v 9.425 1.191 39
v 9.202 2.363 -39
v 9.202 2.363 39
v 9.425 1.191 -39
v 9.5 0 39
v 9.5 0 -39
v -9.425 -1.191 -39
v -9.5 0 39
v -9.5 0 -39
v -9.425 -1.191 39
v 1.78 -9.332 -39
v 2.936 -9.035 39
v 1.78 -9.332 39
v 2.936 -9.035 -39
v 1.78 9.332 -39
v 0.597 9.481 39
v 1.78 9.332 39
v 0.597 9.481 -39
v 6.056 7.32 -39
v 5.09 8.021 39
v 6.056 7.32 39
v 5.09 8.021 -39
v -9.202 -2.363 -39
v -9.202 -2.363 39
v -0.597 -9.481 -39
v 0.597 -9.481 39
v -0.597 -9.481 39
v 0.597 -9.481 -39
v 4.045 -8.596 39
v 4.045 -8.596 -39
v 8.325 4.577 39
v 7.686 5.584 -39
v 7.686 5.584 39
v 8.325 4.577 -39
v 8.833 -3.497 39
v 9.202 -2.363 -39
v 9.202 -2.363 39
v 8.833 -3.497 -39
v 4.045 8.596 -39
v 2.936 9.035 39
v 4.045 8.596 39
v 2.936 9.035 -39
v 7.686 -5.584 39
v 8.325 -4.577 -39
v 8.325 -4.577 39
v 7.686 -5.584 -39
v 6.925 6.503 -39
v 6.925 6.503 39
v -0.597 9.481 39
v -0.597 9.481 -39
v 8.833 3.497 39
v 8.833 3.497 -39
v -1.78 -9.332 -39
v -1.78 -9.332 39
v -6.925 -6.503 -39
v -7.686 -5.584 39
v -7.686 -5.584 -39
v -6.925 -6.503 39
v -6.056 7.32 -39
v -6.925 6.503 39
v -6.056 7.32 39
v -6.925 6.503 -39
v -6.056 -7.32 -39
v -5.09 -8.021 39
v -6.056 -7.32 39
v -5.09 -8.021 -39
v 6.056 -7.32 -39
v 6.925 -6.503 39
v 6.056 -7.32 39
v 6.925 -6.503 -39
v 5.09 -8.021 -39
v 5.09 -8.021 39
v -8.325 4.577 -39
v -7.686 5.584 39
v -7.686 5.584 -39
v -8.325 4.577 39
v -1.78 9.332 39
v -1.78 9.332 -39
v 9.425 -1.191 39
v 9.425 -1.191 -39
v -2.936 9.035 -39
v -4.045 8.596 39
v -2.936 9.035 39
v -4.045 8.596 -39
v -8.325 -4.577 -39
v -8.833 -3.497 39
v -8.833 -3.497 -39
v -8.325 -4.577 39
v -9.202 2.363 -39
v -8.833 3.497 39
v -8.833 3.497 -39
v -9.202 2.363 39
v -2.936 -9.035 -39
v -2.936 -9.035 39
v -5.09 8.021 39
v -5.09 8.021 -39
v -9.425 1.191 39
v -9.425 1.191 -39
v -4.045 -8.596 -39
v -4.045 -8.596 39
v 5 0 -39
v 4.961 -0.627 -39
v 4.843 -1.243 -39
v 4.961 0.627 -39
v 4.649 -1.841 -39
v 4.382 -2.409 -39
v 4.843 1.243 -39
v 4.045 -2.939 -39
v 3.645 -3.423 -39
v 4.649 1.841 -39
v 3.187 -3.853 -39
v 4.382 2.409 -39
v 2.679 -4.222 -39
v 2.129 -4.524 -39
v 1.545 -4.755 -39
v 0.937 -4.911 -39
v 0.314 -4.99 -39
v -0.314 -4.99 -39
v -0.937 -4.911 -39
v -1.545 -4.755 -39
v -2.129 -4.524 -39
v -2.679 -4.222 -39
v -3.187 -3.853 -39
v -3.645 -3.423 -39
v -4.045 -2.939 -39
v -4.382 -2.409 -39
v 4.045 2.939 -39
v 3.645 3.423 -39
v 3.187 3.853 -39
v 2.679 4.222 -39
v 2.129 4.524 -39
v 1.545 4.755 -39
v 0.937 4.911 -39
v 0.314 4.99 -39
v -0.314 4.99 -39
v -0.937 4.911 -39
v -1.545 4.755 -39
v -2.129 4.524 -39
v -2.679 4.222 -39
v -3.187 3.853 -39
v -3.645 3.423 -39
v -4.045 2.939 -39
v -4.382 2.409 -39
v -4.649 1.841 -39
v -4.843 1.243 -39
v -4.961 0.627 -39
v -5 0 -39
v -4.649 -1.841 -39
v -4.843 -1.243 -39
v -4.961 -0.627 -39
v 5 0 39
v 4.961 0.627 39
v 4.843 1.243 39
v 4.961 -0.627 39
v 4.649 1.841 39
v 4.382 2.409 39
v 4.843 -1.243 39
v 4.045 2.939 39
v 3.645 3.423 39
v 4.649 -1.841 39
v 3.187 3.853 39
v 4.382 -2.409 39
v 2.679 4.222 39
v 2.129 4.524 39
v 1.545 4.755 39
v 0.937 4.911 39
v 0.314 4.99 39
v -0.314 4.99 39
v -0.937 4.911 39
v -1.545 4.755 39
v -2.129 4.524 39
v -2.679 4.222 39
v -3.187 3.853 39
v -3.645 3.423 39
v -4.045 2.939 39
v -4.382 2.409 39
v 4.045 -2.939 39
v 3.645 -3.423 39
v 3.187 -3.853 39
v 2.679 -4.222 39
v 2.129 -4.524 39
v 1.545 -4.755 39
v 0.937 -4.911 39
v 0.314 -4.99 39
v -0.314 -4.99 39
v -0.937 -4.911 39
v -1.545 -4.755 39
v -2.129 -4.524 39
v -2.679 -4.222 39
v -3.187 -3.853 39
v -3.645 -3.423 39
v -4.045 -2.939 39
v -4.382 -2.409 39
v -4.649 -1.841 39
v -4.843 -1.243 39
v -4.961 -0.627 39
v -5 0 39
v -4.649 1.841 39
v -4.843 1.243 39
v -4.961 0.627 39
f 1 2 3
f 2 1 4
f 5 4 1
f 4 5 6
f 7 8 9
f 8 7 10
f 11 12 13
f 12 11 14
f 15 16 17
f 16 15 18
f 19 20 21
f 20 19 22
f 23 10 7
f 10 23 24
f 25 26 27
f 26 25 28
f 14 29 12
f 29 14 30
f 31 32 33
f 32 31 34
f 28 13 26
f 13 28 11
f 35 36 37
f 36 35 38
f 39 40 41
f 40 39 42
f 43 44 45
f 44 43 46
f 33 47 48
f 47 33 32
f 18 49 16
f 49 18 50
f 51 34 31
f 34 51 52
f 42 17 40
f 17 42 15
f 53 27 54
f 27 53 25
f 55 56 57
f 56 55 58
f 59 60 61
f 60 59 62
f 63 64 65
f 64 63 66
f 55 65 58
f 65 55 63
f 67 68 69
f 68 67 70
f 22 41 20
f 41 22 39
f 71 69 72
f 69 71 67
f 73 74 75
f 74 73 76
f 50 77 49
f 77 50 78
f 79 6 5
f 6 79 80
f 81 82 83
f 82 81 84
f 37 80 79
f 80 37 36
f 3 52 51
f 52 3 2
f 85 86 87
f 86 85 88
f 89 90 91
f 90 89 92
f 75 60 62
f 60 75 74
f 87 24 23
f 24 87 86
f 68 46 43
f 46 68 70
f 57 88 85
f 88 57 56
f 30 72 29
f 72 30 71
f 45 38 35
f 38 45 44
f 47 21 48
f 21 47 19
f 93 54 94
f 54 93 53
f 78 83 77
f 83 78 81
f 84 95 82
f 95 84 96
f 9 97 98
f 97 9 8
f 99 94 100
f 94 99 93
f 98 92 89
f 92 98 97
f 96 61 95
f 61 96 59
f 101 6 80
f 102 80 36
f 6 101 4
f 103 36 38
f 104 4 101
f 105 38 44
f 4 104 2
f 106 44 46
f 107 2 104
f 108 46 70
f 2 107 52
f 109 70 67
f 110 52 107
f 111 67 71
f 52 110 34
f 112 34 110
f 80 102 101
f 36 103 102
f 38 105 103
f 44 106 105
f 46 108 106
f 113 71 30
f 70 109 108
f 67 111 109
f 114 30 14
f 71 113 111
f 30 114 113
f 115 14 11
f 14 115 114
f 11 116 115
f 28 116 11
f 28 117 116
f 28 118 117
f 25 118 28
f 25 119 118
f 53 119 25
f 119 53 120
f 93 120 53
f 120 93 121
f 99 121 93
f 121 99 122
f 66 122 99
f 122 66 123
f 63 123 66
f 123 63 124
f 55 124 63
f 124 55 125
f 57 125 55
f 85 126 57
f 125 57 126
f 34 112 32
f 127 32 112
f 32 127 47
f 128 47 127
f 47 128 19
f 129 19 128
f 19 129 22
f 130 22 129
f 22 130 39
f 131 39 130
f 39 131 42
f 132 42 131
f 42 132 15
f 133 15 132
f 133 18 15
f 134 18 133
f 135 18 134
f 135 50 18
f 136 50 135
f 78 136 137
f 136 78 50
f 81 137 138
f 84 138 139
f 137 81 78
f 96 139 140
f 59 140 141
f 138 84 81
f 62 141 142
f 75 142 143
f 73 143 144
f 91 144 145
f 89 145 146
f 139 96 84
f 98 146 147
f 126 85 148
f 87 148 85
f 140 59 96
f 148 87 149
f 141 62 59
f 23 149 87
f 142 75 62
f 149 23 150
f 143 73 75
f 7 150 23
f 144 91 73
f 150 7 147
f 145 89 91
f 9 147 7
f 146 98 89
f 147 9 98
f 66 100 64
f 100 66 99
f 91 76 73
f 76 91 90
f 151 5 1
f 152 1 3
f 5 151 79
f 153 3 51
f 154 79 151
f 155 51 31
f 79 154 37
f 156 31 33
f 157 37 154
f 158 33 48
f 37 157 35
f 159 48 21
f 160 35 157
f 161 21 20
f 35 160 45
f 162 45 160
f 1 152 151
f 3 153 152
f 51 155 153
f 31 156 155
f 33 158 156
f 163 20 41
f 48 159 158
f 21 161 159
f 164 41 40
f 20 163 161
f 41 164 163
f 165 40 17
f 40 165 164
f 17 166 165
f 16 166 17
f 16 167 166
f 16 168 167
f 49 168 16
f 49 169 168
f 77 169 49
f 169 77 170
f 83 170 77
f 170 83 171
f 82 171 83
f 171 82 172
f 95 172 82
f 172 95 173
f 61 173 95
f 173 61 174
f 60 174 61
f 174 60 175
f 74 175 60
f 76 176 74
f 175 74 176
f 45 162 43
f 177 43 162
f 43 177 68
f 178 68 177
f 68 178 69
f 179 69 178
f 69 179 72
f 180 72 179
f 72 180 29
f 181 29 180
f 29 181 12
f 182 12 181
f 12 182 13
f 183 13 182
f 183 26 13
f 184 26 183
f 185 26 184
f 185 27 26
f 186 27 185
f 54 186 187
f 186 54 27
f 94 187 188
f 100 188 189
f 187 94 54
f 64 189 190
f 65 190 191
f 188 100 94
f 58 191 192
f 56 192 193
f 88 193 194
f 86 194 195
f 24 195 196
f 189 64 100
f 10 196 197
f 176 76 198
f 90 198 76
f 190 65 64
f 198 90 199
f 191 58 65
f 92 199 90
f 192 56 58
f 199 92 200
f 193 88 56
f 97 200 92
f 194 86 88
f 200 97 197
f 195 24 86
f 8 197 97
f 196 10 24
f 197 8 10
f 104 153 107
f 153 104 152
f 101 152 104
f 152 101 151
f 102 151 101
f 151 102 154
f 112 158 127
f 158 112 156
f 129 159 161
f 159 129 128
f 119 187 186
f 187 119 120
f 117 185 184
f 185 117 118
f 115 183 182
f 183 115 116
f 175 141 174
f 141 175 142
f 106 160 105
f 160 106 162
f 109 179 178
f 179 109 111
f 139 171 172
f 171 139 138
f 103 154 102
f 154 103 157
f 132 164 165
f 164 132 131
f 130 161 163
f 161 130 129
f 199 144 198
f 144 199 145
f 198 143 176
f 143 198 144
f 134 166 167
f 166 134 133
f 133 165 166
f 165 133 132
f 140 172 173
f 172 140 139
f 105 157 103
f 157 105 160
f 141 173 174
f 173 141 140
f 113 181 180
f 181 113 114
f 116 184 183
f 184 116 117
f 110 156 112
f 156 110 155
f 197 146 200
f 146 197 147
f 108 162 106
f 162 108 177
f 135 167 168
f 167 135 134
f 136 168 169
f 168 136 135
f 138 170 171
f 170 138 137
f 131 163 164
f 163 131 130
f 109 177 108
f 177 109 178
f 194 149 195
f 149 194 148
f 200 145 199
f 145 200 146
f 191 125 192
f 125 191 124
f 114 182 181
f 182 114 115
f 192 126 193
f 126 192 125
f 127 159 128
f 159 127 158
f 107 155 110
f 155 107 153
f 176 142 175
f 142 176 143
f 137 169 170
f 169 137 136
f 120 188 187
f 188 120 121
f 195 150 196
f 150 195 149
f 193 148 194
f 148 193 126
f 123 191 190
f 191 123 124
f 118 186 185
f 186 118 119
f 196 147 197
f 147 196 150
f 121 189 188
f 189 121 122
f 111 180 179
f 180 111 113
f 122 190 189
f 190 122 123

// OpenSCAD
$fn = 50;


difference() {
	union() {
		translate(v = [0, 0, -39.0000000000]) {
			cylinder(h = 78, r = 9.5000000000);
		}
	}
	union() {
		translate(v = [0, 0, -100.0000000000]) {
			cylinder(h = 200, r = 5.0000000000);
		}
	}
}
